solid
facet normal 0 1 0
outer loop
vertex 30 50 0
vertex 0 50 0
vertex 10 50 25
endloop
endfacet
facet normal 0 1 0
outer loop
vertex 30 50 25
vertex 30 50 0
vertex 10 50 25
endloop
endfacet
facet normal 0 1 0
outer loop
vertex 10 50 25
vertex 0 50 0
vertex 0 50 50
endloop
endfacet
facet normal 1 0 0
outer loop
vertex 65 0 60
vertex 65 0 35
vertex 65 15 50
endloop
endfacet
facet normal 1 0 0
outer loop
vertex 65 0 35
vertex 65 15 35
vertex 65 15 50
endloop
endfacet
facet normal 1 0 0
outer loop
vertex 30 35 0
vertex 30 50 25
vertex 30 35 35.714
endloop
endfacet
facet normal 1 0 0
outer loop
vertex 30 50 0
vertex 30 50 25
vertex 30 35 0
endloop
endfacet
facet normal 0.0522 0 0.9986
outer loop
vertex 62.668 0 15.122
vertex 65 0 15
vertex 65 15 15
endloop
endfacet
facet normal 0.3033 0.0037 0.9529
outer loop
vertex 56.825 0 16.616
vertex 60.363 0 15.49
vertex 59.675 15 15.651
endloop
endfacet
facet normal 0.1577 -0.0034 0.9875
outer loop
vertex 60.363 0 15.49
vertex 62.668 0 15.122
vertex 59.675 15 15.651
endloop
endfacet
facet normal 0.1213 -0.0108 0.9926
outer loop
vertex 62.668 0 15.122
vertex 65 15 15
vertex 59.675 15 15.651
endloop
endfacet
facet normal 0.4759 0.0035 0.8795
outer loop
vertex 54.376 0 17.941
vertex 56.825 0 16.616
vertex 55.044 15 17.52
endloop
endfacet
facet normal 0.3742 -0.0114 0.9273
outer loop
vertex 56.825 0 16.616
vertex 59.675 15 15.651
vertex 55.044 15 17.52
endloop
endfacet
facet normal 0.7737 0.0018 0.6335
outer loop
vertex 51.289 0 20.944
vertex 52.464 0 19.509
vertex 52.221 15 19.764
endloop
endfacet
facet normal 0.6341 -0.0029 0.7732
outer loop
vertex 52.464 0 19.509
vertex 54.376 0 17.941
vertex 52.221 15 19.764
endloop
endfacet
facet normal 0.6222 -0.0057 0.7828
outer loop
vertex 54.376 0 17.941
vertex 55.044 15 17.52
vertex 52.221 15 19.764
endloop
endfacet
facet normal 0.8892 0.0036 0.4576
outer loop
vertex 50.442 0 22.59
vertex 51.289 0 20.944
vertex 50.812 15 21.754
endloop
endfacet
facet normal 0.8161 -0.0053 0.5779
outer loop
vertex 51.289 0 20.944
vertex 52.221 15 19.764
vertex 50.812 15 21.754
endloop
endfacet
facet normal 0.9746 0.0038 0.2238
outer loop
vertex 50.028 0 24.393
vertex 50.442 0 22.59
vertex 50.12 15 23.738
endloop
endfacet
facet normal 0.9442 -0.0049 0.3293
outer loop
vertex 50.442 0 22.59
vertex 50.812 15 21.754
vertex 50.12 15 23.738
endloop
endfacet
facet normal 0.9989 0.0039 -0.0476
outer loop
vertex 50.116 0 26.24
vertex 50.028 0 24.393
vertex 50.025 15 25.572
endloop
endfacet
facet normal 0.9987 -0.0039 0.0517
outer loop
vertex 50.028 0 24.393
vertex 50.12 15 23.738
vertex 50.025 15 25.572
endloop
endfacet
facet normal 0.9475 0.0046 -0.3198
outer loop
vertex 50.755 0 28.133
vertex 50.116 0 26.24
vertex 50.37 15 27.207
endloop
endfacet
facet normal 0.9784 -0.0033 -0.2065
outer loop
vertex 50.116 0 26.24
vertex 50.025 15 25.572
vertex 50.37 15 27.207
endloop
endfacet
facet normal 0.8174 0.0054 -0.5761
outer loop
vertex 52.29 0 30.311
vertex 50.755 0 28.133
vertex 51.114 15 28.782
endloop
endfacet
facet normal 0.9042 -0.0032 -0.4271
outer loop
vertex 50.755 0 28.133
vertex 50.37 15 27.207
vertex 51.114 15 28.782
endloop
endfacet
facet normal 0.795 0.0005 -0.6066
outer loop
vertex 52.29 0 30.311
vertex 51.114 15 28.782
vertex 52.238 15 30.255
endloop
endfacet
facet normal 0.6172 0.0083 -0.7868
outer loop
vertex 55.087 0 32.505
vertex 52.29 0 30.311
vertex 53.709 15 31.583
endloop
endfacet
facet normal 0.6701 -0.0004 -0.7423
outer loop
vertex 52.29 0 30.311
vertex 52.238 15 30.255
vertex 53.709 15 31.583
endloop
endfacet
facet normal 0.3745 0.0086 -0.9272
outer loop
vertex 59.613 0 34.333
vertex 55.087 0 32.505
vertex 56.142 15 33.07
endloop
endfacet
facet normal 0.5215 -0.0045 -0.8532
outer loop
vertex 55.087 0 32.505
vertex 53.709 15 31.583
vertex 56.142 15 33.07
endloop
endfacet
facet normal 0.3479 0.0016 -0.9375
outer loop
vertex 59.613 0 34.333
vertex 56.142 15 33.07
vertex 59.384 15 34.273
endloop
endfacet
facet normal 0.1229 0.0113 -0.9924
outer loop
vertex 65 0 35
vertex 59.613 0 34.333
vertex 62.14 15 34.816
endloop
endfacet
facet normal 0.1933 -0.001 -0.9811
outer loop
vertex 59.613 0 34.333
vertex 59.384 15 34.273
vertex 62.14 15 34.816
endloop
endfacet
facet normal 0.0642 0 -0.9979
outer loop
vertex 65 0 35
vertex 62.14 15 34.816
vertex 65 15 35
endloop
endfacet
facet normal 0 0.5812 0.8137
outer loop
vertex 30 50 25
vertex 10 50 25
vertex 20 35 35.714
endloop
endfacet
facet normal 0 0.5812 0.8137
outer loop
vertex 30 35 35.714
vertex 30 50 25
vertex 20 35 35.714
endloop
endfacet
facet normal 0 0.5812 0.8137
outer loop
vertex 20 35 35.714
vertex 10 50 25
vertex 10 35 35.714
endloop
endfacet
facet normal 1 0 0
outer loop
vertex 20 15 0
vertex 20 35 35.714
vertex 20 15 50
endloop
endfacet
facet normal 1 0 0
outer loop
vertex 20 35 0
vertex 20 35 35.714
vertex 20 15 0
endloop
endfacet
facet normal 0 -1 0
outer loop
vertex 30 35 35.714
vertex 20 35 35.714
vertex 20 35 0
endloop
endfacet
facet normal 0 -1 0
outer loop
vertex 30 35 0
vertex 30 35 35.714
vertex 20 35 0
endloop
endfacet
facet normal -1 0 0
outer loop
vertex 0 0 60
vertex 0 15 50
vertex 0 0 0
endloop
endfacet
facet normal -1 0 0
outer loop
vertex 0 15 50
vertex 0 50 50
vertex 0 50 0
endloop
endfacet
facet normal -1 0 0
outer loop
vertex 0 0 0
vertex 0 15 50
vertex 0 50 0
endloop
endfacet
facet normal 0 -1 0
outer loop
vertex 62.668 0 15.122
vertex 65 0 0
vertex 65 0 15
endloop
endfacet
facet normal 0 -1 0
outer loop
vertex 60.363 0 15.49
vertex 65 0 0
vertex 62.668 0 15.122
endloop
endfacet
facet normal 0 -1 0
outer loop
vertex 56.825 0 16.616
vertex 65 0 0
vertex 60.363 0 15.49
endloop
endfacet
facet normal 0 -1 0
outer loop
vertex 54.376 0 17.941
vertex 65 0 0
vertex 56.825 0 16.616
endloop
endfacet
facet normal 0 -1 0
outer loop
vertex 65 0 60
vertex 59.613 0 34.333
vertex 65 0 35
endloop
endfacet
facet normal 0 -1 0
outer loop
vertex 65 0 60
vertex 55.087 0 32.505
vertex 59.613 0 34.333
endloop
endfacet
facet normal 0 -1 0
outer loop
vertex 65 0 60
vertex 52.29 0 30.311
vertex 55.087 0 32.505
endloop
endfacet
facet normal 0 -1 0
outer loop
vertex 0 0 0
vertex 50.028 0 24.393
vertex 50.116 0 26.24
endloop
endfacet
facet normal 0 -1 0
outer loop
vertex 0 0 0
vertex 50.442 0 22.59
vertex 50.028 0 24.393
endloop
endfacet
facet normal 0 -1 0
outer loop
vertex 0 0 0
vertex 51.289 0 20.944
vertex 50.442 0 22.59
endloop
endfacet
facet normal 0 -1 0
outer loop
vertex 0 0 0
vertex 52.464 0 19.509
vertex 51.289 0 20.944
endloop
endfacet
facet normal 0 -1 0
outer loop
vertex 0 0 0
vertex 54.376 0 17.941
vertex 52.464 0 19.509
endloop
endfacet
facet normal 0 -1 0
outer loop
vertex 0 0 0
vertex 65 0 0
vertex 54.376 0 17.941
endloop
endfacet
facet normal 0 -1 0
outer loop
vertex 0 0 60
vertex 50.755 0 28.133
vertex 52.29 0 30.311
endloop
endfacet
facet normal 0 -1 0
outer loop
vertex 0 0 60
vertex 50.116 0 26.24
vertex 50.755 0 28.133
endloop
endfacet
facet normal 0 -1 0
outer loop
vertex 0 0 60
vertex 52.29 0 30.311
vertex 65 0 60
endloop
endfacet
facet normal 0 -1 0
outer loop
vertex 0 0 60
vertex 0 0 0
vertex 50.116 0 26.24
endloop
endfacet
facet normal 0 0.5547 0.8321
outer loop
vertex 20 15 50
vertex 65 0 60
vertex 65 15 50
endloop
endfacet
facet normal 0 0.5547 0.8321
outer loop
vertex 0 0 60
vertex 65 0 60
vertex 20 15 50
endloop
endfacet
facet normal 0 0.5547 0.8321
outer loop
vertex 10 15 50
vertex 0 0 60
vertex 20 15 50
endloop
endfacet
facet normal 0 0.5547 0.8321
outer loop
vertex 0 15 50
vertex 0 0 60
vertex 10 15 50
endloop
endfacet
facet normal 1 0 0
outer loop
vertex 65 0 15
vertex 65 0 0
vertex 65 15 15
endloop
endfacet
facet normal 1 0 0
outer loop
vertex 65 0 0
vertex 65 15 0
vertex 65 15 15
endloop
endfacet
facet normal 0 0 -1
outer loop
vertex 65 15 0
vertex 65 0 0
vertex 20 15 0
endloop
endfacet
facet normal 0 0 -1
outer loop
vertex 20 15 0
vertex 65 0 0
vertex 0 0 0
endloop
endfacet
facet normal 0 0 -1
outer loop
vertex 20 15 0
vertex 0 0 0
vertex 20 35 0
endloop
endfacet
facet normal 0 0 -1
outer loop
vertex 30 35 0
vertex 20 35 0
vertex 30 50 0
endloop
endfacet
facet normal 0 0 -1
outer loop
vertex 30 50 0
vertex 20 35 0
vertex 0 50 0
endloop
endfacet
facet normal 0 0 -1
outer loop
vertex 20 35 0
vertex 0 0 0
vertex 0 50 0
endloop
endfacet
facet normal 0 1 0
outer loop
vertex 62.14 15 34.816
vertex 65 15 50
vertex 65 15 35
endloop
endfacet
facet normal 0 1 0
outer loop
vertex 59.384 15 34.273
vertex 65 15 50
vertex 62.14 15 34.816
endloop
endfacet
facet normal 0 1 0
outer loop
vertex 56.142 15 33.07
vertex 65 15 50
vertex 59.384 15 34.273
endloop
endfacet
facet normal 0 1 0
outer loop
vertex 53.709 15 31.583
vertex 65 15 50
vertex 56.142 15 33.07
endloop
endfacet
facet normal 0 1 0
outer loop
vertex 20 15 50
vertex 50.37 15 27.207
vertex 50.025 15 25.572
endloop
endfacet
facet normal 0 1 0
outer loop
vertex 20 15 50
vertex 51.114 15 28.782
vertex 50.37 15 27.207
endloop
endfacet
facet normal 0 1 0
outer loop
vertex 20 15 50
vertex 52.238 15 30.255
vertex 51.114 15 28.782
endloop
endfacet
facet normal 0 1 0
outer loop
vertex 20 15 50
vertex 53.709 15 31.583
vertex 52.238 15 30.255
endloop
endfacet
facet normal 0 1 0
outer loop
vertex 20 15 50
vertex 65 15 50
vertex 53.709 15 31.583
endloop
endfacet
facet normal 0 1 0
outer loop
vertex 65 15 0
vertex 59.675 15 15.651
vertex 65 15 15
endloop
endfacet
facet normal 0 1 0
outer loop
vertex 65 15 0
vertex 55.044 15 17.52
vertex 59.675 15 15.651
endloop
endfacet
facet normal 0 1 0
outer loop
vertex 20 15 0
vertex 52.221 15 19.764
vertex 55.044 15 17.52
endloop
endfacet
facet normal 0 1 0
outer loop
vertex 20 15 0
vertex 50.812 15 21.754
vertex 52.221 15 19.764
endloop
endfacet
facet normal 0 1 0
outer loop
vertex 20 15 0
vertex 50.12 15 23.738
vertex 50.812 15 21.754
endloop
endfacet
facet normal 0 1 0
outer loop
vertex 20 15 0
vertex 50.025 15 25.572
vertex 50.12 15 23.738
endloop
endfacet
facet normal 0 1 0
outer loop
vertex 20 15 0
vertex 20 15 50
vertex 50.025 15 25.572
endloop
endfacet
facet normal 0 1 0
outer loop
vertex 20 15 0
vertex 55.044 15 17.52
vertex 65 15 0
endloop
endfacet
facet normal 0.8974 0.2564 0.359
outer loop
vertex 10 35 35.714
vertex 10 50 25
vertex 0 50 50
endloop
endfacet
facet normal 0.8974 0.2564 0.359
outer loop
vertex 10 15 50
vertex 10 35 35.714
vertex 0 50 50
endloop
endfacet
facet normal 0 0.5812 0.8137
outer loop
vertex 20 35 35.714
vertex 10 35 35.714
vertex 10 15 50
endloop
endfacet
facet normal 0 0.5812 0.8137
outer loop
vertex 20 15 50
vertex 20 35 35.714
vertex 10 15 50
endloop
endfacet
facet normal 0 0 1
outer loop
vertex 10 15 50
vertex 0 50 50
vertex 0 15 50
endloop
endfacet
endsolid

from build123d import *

# Parameters (mm, degrees)
BOSS_EXTRUDE1_DEPTH = 65
BOSS_EXTRUDE2_DEPTH = 20
BOSS_EXTRUDE3_DEPTH = 30
BOSS_EXTRUDE4_DEPTH = 10
CUT_EXTRUDE1_DEPTH  = 10
CUT_EXTRUDE3_REACH  = 97.131
SKETCH3_RX          = 15
SKETCH3_RY          = 10


with BuildPart() as part:
    # Sketch1 → Boss-Extrude1 (new body)
    with BuildSketch(Plane(origin=(0, 0, 0), x_dir=(0, 0, -1), z_dir=(1, 0, 0))):
        Polygon((0, 0), (0, 15), (-50, 15), (-60, 0), align=None)
    extrude(amount=BOSS_EXTRUDE1_DEPTH)

    # Sketch1<3> → Boss-Extrude2 (add)
    with BuildSketch(Plane(origin=(0, 0, 0), x_dir=(0, 0, -1), z_dir=(1, 0, 0))):
        Polygon((-50, 15), (0, 15), (0, 35), (-35.714285714, 35), align=None)
    extrude(amount=BOSS_EXTRUDE2_DEPTH)

    # Sketch1<4> → Boss-Extrude3 (add)
    with BuildSketch(Plane(origin=(0, 0, 0), x_dir=(0, 0, -1), z_dir=(1, 0, 0))):
        Polygon((-35.714285714, 35), (0, 35), (0, 50), (-25, 50), align=None)
    extrude(amount=BOSS_EXTRUDE3_DEPTH)

    # Sketch1<5> → Boss-Extrude4 (add)
    with BuildSketch(Plane(origin=(0, 0, 0), x_dir=(0, 0, -1), z_dir=(1, 0, 0))):
        Polygon((-50, 50), (-50, 15), (-35.714285714, 35), (-25, 50), align=None)
    extrude(amount=BOSS_EXTRUDE4_DEPTH)

    # Sketch2 → Cut-Extrude1 (cut, along a direction that is not the sketch's normal)
    with BuildSketch(Plane(origin=(27.613412229, 7.889546351, 11.045364892), x_dir=(-0.3451624427428596, -0.09861784078367415, 0.9333474217026305), z_dir=(-0.8974358974358975, -0.2564102564102566, -0.358974358974359))):
        Polygon((41.736479046, 48.076197382), (14.951169076, 45.328986103), (41.736479046, 11.675647936), align=None)
    extrude(amount=-CUT_EXTRUDE1_DEPTH, dir=(-1, 0, 0), mode=Mode.SUBTRACT)

    # Sketch3 → Cut-Extrude3 (cut, up to next)
    with BuildSketch(Plane(origin=(0, 15, 0), x_dir=(1, 0, 0), z_dir=(0, 1, 0)), mode=Mode.PRIVATE) as cut_extrude3_sk1:
        with Locations((65, -25)):
            Ellipse(SKETCH3_RX, SKETCH3_RY)
    cut_extrude3_tool1 = extrude(cut_extrude3_sk1.sketch, amount=-CUT_EXTRUDE3_REACH, mode=Mode.PRIVATE) & part.part
    add(cut_extrude3_tool1.solids().sort_by_distance((65, 15, 25))[0], mode=Mode.SUBTRACT)


solid = part.part
